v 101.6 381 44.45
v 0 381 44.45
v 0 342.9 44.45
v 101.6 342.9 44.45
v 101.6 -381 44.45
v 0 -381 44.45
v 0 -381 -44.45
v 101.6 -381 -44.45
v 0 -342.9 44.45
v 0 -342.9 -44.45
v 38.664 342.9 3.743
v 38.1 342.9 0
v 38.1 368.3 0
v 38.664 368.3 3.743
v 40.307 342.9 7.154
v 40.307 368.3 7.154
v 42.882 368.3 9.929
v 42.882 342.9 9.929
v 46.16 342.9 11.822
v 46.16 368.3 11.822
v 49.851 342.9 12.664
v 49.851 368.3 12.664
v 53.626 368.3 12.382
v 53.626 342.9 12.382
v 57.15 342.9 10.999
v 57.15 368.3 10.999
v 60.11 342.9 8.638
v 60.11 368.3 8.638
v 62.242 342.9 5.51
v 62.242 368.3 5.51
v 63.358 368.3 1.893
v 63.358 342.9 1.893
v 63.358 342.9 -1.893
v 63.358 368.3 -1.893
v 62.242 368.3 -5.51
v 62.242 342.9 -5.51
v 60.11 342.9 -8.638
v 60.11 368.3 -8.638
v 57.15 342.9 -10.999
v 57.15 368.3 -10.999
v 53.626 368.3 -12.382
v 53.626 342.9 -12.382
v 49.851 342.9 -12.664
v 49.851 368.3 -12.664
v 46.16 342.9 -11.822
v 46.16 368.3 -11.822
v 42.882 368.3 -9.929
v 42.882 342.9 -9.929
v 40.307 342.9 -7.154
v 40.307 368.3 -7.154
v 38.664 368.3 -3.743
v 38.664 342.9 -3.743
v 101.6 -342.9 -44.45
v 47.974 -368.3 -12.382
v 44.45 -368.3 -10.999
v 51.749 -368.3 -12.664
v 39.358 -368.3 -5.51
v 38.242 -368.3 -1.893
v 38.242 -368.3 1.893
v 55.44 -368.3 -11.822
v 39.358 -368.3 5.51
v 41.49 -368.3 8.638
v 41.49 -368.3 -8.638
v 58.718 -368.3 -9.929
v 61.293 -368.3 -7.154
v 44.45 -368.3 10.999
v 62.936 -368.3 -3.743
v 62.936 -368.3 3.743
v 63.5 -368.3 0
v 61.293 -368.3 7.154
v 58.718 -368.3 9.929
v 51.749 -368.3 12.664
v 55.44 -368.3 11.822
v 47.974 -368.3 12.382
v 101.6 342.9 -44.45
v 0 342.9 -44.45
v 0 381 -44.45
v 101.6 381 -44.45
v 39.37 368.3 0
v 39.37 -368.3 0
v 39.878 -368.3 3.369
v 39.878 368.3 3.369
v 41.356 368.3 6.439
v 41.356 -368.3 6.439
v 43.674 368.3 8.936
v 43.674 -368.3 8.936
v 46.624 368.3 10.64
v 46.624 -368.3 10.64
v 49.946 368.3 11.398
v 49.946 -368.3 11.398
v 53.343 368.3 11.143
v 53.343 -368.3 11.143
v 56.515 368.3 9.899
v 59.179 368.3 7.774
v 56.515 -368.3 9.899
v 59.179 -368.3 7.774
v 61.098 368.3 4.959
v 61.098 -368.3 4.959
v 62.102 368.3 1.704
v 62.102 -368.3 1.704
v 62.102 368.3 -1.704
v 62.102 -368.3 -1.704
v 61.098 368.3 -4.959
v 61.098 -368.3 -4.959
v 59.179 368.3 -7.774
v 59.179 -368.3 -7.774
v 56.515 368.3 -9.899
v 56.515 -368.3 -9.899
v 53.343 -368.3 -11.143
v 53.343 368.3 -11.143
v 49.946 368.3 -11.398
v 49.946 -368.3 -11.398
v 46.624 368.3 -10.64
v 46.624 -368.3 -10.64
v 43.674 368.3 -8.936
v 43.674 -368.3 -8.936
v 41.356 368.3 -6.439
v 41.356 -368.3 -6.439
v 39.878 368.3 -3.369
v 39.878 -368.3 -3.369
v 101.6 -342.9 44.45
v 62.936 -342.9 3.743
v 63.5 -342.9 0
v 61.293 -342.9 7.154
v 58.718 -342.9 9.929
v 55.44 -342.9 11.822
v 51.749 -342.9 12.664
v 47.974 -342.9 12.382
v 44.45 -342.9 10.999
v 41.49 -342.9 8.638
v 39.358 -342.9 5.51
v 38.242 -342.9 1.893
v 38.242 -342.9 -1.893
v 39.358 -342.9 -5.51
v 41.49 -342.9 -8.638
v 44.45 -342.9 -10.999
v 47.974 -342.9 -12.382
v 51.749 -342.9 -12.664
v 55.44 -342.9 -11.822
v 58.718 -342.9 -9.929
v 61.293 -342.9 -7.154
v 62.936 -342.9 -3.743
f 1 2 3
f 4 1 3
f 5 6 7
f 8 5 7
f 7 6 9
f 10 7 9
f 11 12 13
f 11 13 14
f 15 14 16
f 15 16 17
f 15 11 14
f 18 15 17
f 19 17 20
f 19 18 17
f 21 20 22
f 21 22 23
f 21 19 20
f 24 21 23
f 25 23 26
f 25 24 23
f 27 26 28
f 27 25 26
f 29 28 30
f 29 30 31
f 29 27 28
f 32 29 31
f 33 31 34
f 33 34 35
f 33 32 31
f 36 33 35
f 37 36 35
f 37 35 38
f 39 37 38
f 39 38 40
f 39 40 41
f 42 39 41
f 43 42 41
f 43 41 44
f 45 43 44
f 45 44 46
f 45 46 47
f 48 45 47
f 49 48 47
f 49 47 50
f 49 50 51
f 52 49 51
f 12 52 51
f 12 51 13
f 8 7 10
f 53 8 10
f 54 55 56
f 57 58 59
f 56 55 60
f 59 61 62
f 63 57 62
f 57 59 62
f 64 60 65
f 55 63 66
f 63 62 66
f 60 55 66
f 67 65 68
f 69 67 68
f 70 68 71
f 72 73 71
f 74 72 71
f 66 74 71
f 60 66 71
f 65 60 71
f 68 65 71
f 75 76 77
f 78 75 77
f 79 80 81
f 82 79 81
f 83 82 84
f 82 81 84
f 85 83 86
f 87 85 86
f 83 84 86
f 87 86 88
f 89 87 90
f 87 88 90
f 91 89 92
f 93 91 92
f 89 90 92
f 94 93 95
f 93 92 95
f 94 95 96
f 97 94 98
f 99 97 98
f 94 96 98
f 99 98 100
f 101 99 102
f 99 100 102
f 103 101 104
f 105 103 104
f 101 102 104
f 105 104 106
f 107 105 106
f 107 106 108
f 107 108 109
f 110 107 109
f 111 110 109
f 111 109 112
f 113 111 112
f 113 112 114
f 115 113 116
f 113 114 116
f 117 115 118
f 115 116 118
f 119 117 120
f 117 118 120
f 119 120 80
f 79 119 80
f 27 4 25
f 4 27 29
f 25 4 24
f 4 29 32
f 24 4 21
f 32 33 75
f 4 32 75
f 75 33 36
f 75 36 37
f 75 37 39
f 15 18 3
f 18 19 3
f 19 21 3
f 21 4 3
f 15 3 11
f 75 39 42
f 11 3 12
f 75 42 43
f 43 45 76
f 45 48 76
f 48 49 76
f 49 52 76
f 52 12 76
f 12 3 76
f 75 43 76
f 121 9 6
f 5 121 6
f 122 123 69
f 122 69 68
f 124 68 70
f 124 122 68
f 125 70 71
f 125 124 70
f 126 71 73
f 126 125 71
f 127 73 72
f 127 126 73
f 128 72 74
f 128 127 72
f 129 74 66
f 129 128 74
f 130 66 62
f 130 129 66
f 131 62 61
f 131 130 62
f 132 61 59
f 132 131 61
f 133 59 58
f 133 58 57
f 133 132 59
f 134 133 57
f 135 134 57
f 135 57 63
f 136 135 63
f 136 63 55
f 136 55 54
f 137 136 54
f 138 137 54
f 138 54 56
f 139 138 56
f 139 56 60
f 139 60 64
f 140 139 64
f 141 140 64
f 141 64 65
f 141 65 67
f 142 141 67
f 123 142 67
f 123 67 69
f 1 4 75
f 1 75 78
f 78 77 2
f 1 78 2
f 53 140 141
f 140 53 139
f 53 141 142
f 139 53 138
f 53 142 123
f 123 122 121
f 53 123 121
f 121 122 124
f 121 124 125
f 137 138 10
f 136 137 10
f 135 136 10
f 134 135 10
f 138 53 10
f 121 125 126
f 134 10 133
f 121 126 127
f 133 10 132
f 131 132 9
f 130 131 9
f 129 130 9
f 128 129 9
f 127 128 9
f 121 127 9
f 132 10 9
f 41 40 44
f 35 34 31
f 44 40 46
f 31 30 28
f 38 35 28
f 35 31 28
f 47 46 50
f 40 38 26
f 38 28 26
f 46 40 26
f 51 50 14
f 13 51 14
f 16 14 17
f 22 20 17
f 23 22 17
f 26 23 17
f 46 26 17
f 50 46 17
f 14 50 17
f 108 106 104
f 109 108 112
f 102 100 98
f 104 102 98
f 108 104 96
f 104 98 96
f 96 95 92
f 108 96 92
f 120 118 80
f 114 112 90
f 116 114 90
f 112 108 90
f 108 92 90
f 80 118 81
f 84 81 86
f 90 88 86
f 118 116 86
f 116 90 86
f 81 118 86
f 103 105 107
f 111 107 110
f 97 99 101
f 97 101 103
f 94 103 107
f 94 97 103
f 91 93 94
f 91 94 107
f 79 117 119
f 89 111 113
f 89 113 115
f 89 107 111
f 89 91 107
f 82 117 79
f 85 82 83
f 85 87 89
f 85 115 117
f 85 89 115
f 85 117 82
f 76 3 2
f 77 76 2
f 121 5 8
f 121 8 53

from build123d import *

# Parameters (mm, degrees)
F1_DEPTH = 101.6
F2_R     = 12.7
F3_DEPTH = 711.2
F4_R     = 12.7
F5_DEPTH = 711.2
F6_R     = 11.43
F7_DEPTH = 736.6


with BuildPart() as f1:
    # F0 (on Right) → F1 (new body)
    with BuildSketch(Plane.YZ):
        Polygon((-342.9, -44.45), (-342.9, 0), (-342.9, 44.45), (-381, 44.45), (-381, -44.45), align=None)
        Polygon((342.9, 44.45), (342.9, 0), (342.9, -44.45), (381, -44.45), (381, 44.45), align=None)
    extrude(amount=F1_DEPTH)

    # F2 (on face) → F3 (cut)
    with BuildSketch(Plane(origin=(0, -342.9, 0), x_dir=(-1, 0, 0), z_dir=(0, 1, 0))):
        with Locations((-50.8, 0)):
            Circle(F2_R)
    extrude(amount=F3_DEPTH, mode=Mode.SUBTRACT)

    # F4 (on face) → F5 (cut)
    with BuildSketch(Plane.XZ.offset(-342.9)):
        with Locations((50.8, 0)):
            Circle(F4_R)
    extrude(amount=F5_DEPTH, mode=Mode.SUBTRACT)


with BuildPart() as f7:
    # F6 (on face) → F7 (new body)
    with BuildSketch(Plane(origin=(0, -368.3, 0), x_dir=(-1, 0, 0), z_dir=(0, 1, 0))):
        with Locations((-50.8, 0)):
            Circle(F6_R)
    extrude(amount=F7_DEPTH)


solid = Compound([f1.part, f7.part])
